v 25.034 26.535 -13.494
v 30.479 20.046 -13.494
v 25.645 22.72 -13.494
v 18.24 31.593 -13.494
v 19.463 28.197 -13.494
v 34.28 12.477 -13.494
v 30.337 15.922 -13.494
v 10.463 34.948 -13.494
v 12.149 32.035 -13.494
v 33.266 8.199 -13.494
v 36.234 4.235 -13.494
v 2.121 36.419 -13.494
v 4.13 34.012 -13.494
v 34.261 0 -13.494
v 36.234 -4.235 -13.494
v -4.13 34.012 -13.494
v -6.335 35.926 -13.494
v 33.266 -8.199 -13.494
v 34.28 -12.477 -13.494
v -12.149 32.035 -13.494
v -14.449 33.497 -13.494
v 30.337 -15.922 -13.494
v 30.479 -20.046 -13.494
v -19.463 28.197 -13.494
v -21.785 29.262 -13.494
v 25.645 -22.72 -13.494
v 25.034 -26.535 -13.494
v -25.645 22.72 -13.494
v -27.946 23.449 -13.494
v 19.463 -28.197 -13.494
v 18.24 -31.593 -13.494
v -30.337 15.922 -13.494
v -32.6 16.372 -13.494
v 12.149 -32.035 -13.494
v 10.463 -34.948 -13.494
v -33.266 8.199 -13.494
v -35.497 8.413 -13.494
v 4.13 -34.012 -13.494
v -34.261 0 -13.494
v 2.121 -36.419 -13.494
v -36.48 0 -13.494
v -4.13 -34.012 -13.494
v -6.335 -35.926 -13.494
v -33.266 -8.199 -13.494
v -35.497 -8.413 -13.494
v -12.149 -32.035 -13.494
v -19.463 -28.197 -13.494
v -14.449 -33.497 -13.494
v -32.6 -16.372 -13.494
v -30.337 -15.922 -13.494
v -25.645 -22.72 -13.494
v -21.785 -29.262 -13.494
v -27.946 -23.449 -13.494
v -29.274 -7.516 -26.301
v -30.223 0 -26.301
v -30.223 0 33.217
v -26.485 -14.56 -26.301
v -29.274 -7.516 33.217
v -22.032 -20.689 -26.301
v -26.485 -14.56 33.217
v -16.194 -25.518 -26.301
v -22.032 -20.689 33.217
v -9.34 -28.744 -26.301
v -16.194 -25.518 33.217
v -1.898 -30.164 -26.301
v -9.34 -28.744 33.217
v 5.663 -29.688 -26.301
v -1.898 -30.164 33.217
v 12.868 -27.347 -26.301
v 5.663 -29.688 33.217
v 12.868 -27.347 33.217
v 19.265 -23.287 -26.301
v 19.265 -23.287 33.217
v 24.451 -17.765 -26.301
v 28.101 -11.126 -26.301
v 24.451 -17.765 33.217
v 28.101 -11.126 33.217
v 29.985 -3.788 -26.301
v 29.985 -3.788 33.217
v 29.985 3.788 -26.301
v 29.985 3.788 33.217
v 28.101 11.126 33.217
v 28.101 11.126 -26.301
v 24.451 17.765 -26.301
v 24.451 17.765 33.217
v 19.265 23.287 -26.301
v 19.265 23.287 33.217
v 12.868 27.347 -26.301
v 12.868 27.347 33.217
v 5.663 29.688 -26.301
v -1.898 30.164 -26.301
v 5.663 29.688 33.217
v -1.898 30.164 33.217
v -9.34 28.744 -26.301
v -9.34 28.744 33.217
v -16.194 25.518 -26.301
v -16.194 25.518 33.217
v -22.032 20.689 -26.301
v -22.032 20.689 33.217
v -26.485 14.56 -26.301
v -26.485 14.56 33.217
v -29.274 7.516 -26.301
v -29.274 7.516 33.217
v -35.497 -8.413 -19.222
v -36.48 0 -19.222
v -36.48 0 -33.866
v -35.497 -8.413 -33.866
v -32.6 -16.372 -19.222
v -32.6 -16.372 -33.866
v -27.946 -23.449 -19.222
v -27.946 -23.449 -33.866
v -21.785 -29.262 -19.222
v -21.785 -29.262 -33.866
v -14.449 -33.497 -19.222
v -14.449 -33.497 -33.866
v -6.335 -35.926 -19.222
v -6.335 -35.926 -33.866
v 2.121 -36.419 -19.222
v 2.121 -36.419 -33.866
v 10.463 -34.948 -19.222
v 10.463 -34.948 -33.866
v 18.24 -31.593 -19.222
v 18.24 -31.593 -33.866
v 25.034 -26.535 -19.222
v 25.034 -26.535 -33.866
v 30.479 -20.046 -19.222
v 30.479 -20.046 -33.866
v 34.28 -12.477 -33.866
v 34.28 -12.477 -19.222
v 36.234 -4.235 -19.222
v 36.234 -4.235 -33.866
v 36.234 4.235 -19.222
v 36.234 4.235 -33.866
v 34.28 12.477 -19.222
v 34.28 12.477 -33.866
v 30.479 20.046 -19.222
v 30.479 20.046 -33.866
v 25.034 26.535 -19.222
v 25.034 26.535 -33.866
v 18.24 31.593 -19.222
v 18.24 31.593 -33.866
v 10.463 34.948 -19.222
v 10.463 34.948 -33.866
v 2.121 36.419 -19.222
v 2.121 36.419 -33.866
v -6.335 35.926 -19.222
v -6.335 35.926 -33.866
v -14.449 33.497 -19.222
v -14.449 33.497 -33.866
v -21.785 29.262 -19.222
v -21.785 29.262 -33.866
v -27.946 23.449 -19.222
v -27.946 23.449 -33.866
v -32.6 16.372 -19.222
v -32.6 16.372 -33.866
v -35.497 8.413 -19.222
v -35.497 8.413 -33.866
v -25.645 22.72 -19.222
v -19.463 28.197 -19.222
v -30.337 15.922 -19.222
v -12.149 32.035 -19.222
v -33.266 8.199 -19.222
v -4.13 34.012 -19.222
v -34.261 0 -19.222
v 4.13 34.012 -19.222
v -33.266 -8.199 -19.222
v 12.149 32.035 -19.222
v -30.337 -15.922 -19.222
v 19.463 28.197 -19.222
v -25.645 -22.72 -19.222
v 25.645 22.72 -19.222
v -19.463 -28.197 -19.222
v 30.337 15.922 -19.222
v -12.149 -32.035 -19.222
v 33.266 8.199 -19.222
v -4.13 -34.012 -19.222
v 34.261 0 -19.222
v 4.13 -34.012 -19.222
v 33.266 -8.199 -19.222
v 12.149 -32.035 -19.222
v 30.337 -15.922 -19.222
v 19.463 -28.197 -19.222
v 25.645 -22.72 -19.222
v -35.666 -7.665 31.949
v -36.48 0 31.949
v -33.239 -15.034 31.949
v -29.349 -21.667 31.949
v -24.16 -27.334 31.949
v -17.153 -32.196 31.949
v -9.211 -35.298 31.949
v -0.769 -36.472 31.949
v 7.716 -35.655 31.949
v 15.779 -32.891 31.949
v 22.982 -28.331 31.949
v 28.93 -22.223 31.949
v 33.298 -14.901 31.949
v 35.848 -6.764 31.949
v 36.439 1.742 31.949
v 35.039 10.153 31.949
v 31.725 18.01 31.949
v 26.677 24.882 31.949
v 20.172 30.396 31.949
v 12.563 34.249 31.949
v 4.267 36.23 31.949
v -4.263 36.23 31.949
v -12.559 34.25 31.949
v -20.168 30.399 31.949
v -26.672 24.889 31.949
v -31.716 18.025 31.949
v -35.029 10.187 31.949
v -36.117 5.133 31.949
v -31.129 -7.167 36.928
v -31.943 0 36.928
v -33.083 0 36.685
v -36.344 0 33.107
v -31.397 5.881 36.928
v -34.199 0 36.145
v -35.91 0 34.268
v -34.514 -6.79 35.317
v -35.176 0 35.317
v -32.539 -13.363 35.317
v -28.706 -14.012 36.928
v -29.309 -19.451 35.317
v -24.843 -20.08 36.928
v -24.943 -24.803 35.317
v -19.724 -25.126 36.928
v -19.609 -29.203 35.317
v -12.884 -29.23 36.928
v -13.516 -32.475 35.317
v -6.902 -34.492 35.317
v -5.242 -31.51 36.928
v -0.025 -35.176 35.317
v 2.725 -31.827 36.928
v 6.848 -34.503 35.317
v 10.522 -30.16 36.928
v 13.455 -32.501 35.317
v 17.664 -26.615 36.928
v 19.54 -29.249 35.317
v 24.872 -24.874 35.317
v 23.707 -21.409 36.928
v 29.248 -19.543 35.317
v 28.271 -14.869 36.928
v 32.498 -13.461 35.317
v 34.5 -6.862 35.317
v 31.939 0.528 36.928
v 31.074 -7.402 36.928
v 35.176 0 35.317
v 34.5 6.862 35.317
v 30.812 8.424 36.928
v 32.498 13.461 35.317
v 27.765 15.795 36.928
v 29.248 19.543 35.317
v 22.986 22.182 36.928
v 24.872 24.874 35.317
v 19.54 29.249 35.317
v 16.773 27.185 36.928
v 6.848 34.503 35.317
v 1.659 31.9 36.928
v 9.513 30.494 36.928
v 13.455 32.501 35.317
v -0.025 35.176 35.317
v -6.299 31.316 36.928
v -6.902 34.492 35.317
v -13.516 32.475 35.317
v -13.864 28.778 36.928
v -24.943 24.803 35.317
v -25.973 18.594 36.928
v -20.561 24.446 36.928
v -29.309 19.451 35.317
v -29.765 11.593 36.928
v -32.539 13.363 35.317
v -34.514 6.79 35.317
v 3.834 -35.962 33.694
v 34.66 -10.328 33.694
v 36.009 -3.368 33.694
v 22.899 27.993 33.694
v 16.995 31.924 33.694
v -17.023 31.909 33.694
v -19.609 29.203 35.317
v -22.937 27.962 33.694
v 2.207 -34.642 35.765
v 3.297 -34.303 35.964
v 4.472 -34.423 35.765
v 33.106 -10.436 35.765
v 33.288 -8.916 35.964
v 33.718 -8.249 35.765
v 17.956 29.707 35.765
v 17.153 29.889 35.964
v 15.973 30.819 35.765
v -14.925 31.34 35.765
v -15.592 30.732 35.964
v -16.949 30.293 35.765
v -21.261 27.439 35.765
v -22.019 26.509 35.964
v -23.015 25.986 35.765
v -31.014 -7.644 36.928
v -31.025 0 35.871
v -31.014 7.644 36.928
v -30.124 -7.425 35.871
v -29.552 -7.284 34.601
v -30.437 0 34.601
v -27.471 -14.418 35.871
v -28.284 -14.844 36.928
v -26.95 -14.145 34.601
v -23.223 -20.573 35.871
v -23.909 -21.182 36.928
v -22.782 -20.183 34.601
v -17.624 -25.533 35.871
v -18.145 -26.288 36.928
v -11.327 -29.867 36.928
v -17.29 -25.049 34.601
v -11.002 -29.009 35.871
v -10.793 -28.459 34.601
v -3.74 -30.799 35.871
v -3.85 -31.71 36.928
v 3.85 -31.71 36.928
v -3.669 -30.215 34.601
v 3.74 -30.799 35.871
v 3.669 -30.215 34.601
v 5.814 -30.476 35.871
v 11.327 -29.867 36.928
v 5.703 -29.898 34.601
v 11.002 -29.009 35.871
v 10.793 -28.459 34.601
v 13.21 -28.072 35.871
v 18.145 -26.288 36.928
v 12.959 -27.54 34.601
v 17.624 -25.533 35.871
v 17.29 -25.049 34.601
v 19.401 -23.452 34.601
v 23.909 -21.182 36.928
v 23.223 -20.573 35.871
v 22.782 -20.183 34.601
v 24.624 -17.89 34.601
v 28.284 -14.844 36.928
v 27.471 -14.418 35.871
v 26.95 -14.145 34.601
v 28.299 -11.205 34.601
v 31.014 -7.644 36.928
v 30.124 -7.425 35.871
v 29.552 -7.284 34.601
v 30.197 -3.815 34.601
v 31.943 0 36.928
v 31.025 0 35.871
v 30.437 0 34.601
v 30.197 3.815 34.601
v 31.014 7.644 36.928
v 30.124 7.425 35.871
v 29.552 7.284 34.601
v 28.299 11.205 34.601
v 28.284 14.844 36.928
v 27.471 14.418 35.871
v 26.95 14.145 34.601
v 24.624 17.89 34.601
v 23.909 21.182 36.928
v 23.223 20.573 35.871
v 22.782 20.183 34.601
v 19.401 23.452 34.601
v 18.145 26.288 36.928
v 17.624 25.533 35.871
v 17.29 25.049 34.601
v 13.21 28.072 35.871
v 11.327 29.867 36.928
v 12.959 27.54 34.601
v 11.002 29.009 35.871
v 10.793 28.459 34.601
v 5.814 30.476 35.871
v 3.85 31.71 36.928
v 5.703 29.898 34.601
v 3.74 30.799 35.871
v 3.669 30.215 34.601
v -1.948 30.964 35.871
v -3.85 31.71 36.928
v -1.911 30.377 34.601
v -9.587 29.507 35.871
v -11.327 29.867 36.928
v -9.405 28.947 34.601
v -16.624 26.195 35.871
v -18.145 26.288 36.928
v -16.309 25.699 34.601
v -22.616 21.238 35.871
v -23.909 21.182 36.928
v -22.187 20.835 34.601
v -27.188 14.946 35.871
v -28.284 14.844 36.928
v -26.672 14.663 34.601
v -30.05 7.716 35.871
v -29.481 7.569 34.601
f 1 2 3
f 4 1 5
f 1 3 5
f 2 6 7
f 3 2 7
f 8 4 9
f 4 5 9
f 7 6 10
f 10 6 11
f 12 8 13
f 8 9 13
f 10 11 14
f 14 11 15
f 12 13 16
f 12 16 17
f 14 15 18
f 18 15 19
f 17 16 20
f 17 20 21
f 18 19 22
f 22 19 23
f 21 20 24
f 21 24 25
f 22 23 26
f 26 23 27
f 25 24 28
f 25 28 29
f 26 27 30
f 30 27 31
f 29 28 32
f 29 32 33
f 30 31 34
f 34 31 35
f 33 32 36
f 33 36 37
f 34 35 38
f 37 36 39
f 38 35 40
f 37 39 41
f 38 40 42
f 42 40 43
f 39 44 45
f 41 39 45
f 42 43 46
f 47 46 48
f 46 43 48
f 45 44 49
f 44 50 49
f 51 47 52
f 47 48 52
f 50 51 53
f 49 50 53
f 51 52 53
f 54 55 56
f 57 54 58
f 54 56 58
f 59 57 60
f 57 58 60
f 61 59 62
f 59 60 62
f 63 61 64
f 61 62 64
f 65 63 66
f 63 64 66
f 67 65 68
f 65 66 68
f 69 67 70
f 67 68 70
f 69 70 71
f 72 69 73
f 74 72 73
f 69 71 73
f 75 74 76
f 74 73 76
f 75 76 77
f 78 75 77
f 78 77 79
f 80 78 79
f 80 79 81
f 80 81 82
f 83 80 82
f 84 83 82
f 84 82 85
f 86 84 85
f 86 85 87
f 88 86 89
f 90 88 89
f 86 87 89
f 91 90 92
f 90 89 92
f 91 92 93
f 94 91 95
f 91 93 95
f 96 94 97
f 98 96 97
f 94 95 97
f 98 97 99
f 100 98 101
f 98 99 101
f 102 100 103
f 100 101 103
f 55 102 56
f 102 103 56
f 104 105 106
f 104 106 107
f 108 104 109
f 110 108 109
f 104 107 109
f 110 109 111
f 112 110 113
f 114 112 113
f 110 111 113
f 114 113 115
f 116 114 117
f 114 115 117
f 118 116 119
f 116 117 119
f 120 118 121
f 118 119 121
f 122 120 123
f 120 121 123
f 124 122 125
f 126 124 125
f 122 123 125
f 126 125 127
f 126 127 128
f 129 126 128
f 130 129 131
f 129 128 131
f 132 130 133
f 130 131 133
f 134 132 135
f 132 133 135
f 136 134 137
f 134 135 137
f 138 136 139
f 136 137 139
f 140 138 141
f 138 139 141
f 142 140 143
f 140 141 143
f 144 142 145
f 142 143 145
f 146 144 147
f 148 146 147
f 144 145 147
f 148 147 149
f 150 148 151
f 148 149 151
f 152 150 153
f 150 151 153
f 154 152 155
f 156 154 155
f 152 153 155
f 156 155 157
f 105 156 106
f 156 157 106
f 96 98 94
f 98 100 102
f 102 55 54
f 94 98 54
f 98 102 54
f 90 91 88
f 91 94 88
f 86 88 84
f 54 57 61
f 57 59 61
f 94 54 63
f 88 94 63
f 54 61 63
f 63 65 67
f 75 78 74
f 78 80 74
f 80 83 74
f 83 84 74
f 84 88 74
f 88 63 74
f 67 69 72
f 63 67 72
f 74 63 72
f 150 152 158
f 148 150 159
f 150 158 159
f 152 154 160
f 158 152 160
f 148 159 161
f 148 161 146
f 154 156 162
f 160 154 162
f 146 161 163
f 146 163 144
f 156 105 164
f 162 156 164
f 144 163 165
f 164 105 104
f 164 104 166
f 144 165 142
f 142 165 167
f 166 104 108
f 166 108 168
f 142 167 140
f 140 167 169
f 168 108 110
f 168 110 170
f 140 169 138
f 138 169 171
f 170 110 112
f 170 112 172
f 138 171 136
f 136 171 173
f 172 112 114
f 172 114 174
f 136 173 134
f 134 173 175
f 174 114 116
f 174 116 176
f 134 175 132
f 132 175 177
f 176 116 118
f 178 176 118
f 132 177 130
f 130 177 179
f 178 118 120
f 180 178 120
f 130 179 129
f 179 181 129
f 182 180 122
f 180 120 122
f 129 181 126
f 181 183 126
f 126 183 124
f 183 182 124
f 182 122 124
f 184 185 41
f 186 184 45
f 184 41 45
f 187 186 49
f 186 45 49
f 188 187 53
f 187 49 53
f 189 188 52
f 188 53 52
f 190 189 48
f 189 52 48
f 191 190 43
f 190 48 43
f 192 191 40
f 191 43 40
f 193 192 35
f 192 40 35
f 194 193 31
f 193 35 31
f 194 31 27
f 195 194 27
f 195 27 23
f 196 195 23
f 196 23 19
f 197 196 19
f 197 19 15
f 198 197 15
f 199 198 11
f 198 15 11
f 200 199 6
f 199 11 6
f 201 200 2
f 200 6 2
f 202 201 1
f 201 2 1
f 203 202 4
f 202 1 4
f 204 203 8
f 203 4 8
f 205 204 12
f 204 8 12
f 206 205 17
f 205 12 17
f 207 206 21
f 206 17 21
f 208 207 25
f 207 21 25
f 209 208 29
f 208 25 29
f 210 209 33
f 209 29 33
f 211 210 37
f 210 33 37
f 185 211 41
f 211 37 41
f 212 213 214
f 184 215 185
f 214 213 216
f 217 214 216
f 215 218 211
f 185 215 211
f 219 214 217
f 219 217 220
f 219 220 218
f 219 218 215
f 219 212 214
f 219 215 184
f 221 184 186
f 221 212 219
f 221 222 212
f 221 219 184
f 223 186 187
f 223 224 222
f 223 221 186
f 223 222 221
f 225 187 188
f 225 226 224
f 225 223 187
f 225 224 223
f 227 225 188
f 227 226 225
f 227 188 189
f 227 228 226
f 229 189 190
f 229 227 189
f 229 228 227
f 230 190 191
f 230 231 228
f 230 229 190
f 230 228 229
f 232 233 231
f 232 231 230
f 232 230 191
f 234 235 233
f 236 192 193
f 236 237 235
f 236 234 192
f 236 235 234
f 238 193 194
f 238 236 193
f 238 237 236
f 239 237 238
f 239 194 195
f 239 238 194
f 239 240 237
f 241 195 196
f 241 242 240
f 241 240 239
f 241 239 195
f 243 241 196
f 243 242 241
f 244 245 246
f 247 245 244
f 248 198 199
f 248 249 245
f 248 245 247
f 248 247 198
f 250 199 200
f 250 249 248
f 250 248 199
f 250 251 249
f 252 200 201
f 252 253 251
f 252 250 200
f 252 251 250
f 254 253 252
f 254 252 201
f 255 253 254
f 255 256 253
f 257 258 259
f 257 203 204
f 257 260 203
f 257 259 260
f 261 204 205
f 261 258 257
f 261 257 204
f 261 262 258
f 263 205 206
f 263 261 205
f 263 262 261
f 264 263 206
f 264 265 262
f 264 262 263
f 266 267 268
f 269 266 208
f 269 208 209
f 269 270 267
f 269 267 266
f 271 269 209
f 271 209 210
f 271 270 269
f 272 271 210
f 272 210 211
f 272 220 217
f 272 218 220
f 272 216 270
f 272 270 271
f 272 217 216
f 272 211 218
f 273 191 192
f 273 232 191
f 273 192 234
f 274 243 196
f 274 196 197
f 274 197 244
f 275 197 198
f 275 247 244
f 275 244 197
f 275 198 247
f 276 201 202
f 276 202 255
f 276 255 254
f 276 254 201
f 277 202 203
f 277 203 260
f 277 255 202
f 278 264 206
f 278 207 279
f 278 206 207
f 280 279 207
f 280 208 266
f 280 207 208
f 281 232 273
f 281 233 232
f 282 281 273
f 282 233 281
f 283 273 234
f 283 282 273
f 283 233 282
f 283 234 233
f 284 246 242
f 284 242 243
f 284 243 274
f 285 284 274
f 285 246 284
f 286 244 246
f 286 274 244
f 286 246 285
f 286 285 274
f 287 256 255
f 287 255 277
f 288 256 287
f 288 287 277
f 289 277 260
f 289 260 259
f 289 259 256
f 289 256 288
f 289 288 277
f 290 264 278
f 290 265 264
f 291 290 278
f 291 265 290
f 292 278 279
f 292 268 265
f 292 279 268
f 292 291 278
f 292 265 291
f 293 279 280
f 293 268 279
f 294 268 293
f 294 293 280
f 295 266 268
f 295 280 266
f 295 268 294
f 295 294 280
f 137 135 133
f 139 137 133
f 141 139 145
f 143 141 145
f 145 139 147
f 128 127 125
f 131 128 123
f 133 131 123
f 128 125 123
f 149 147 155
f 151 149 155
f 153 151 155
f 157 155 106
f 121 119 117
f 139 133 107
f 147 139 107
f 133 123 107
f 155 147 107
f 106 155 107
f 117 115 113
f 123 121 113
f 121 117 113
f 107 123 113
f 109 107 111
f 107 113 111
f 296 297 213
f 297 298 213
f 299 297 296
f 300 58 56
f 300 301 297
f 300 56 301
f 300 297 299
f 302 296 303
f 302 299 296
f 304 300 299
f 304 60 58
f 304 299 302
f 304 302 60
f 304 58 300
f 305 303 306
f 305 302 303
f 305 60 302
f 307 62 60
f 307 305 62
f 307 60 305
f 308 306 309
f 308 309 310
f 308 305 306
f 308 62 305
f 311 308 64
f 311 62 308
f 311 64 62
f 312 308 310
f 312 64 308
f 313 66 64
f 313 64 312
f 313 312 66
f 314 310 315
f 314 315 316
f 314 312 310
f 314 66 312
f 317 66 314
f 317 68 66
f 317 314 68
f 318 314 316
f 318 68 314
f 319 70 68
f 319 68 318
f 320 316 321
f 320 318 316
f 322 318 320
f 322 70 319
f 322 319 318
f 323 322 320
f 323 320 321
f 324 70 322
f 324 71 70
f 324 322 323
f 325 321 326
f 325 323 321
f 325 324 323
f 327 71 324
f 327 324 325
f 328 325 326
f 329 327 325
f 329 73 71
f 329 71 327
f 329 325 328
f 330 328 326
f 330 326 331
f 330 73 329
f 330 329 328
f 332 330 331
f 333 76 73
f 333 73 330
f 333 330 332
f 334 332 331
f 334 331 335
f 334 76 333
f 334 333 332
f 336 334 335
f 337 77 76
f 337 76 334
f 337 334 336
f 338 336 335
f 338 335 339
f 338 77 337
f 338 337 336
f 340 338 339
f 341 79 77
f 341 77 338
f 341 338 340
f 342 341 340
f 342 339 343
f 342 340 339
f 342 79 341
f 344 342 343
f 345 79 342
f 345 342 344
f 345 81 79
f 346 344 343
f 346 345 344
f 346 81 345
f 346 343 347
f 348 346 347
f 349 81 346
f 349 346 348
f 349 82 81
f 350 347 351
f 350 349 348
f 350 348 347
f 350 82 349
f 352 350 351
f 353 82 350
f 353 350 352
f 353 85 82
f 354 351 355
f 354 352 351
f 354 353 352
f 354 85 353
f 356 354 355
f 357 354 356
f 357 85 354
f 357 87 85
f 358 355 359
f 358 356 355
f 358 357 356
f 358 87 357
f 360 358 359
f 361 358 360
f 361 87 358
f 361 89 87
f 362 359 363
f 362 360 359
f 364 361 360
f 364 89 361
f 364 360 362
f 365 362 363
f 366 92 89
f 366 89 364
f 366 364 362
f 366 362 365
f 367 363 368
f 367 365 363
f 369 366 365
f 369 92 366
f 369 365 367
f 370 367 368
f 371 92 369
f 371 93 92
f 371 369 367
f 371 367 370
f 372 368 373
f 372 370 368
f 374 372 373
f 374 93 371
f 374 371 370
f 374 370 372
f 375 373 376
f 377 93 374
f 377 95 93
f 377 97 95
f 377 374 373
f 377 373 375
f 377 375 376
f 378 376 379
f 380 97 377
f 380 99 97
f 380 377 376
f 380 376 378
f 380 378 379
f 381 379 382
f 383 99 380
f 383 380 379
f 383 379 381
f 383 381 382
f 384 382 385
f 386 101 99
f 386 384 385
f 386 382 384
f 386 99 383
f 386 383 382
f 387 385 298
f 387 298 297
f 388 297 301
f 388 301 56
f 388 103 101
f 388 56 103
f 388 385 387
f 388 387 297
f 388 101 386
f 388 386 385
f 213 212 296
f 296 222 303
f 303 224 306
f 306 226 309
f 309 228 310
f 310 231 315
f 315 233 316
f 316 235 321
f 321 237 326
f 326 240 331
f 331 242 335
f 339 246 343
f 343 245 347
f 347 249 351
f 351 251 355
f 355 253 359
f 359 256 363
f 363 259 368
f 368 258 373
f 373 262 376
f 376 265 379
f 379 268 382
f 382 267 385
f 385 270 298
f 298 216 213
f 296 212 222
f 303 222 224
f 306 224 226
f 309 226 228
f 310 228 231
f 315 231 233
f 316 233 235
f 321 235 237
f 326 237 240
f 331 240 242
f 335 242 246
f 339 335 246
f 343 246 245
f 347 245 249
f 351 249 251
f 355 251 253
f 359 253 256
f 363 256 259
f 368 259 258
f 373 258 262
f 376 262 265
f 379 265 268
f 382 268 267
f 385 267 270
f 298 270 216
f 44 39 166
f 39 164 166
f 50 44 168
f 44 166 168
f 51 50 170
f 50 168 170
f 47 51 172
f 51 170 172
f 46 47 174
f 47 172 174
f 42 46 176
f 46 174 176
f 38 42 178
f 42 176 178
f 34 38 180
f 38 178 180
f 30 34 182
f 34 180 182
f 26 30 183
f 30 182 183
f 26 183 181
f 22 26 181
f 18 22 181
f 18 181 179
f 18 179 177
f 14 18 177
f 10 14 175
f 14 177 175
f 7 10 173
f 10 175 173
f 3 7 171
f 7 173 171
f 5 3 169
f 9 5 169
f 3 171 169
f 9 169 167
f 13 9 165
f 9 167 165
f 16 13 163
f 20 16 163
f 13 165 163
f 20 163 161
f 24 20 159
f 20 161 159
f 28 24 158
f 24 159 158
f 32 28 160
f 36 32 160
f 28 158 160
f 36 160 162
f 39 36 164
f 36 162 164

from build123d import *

# Parameters (mm, degrees)
F2_R = 5


# Not quite as in the source:
# - a fillet or chamfer that OpenCascade refuses, or shapes differently, is made with other operations: its cross-section is extruded or revolved along the edge and cut away or added


with BuildPart() as f1:
    # F0 (on Front) → F1 (revolve)
    with BuildSketch(Plane.XZ):
        Polygon((-30.2233248949, 37.0877869427), (-36.4803494329, 36.5061946213), (-36.4803494329, -13.4938053787), (-34.2613953475, -13.4938053787), (-34.2613953475, -19.2220297002), (-36.4803494329, -19.2220297002), (-36.4803494329, -33.86637941), (-19.9121574584, -33.86637941), (0, -33.86637941), (0, -26.3013252845), (-30.2233248949, -26.3013252845), align=None)
    revolve(axis=Axis((0, 0, -30.0838523473), (0, 0, 1)))

    # F2
    f2_edges = [f1.edges().sort_by_distance(p)[0] for p in [
        (36.480349, 0, 36.506195),
    ]]
    fillet(f2_edges, radius=F2_R)

    # F3: fillet of radius 5 on 2 edges, made by hand

    # F3_s1 → F3_t2 (revolve, cut)
    with BuildSketch(Plane.XZ):
        with BuildLine():
            ThreePointArc((-31.9428428579, 36.9282346211), (-30.6731716306, 35.2277917828), (-30.2229248949, 33.1539430061))
            Line((-30.2229248949, 33.1539430061), (-29.7228023494, 33.1539430061))
            ThreePointArc((-29.7228023494, 33.1539430061), (-29.7232023494, 35.1208649744), (-29.7232023494, 37.0877869427))
            Line((-29.7232023494, 37.0877869427), (-30.2696119123, 37.5857629186))
            ThreePointArc((-30.2696119123, 37.5857629186), (-31.1293581124, 37.5058492495), (-31.6147121087, 37.3056637826))
            Line((-31.6147121087, 37.3056637826), (-31.9428428579, 36.9282346211))
        make_face()
    revolve(axis=Axis((0, 0, 37.0877869427), (0, 0, 1)), mode=Mode.SUBTRACT)


solid = f1.part
